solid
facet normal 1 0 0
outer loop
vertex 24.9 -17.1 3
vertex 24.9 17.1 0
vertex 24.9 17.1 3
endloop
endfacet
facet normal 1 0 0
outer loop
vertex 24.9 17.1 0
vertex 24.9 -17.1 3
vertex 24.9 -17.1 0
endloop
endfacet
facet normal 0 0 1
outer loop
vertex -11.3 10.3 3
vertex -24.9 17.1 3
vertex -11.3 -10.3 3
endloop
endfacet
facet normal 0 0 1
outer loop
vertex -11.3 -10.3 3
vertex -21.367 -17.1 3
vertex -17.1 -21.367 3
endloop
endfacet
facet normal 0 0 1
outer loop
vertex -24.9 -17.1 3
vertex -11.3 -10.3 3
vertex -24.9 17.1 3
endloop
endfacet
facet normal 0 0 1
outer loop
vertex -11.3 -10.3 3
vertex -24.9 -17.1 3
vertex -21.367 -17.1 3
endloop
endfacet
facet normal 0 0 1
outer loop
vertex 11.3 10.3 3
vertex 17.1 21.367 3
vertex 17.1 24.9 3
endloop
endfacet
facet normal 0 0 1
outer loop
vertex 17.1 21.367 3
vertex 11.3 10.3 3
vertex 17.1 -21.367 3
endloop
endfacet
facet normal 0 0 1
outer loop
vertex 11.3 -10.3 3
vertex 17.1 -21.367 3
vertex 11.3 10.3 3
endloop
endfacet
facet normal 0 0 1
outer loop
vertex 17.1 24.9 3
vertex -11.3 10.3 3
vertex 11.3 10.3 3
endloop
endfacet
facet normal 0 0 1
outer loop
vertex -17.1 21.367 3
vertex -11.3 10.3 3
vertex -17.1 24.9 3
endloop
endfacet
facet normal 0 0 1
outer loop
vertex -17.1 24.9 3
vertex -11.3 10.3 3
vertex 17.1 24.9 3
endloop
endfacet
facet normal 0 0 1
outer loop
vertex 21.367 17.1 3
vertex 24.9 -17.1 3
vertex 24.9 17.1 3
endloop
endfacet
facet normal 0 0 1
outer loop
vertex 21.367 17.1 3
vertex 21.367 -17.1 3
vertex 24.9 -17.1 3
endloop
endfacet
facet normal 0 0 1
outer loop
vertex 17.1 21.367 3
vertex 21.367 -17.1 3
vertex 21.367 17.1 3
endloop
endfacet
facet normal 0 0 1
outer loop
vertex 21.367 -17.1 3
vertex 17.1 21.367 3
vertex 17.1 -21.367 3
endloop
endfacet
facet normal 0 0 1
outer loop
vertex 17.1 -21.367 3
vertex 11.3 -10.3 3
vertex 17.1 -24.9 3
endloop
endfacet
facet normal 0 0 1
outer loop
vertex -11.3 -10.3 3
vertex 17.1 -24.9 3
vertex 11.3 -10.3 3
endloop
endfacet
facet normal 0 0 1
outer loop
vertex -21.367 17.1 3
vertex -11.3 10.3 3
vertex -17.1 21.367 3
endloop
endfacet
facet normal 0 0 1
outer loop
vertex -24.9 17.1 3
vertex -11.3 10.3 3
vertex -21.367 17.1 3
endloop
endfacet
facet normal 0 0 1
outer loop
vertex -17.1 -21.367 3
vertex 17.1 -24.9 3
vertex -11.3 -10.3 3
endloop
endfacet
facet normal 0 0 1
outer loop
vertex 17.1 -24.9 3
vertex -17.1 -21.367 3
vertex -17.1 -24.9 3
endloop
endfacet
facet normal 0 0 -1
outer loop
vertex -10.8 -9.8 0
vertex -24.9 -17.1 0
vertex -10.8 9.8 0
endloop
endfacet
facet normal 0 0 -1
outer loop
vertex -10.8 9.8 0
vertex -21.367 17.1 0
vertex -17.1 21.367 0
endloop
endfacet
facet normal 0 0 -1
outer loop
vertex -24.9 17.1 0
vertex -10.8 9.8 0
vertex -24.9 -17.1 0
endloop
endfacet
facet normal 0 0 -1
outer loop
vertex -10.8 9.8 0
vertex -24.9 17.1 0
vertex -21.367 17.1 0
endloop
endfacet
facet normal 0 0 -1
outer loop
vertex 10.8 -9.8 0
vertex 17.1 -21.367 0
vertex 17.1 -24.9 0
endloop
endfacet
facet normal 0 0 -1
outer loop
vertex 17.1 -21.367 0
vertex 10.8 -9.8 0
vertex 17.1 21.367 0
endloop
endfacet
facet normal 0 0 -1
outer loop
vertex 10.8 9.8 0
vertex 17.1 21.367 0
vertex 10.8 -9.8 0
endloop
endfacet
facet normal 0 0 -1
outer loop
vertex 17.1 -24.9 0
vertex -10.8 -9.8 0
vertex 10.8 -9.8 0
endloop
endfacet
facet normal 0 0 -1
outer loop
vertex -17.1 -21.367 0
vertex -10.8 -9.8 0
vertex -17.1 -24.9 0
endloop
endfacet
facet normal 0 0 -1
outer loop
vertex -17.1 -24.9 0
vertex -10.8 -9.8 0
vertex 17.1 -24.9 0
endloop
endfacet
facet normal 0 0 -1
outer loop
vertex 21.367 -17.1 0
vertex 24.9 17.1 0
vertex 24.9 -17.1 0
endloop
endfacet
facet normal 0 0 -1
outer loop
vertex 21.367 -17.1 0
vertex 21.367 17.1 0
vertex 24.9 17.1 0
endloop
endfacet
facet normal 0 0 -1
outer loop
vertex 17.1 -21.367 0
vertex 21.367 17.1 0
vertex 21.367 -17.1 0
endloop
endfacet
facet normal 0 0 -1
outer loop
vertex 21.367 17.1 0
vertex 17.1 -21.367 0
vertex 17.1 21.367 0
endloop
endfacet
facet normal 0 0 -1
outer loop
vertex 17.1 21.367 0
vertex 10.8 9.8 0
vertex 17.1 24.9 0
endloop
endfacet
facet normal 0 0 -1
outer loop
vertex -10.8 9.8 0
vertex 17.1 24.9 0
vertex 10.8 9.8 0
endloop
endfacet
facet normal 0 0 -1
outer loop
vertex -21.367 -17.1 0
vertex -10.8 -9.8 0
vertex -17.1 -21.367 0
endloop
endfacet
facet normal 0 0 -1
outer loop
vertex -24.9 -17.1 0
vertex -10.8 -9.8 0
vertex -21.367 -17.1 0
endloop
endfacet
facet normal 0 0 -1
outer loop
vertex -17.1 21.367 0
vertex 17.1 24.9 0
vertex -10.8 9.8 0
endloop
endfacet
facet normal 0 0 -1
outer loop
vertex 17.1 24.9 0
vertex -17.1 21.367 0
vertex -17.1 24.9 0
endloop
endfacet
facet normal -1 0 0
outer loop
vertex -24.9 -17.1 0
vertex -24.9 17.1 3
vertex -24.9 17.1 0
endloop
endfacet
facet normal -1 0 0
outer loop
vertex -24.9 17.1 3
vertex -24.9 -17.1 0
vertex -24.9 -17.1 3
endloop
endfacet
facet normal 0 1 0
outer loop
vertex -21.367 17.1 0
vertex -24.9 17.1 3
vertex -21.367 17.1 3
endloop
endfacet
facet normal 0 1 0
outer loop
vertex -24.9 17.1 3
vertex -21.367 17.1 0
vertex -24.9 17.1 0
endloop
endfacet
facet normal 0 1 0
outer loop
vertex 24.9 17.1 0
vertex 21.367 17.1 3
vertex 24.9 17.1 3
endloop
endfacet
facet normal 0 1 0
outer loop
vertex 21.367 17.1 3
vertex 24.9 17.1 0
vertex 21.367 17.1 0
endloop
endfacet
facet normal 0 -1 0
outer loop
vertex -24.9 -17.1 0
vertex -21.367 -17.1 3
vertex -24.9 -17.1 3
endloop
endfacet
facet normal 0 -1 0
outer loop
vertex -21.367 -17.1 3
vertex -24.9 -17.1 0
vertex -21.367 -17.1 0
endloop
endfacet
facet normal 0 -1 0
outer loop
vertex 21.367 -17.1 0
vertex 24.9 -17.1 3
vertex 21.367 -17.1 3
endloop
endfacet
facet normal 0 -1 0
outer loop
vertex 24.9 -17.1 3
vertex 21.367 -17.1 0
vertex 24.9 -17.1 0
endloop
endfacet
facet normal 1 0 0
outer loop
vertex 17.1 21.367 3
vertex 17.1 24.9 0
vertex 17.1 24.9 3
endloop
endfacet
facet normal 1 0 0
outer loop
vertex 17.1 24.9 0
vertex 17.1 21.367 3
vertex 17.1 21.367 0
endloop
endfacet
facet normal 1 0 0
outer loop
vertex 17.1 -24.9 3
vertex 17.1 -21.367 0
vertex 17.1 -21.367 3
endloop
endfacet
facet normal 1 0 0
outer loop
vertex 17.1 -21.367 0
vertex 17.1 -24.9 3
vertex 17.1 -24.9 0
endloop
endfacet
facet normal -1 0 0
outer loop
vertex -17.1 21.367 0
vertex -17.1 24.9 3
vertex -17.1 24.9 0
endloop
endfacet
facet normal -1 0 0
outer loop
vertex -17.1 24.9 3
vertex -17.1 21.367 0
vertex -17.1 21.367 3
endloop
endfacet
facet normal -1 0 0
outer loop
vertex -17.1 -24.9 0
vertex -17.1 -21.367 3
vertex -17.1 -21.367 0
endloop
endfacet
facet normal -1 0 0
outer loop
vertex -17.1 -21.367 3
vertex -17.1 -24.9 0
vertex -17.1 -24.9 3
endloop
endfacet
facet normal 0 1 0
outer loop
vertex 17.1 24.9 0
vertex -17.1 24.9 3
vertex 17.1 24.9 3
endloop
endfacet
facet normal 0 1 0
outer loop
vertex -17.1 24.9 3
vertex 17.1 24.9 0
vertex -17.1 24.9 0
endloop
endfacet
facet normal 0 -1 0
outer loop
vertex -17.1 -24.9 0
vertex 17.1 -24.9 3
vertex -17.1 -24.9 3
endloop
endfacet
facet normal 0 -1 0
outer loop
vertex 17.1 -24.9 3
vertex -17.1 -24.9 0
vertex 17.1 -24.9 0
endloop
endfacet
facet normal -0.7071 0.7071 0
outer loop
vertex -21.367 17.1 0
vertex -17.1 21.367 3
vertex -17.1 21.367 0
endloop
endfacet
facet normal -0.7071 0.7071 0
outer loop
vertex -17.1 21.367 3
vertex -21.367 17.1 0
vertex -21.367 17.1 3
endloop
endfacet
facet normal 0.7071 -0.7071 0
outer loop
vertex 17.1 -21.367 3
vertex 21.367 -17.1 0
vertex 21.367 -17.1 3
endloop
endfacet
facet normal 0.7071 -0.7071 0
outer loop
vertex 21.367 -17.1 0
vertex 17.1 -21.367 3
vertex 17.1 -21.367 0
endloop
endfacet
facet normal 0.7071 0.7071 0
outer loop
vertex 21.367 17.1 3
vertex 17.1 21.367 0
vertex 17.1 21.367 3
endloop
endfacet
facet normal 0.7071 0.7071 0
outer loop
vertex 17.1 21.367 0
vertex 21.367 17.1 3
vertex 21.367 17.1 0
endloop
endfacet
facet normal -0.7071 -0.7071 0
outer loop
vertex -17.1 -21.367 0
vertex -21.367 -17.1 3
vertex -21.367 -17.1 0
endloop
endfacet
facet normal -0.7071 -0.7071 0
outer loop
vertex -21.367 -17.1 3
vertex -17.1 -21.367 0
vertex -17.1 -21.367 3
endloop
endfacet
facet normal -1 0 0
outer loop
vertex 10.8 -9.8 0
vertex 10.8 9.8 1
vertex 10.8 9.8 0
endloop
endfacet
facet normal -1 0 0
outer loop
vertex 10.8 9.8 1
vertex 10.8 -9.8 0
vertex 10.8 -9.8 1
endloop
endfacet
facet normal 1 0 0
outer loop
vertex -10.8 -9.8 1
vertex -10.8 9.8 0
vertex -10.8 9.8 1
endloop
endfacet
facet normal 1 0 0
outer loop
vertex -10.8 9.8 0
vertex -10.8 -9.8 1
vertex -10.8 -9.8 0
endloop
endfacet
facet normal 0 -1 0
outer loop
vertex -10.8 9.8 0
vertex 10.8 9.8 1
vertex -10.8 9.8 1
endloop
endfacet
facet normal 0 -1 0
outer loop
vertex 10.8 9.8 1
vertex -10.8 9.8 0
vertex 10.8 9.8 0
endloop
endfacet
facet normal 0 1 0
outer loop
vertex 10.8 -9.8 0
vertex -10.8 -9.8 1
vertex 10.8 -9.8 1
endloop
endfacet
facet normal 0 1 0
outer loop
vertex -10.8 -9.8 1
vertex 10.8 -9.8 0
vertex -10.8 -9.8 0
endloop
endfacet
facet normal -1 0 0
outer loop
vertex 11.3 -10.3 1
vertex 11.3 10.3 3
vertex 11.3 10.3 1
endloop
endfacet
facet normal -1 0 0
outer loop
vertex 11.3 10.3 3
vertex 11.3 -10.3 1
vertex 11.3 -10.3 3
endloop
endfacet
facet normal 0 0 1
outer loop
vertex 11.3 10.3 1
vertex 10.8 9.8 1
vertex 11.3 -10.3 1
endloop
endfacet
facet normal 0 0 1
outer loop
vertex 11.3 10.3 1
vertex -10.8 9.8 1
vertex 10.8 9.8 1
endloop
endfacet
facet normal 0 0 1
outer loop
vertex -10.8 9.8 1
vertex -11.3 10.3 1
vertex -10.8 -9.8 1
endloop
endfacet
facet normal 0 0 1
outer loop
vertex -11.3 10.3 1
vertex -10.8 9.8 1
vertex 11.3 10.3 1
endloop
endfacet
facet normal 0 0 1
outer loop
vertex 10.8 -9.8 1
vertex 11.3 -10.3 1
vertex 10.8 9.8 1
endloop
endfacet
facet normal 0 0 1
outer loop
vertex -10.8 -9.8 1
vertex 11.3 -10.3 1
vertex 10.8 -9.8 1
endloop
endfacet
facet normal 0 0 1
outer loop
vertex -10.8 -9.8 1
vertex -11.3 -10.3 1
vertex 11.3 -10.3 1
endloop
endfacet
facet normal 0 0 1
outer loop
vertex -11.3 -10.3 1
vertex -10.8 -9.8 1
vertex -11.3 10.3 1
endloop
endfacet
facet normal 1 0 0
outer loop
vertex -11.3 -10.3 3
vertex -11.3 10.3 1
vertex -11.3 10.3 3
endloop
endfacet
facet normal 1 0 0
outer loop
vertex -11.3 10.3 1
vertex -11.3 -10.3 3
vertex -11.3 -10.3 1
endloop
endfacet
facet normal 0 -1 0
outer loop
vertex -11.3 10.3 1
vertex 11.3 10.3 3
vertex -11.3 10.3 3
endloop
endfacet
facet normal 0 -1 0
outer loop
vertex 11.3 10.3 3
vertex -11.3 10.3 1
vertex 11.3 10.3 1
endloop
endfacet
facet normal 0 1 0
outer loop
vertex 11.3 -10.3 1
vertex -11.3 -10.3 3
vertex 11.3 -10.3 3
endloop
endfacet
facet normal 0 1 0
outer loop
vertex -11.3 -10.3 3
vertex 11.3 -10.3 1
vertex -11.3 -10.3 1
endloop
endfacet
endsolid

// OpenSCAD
//Cube with walls insert template

IM_offset = 0.3;

a = 49.8;
b = 33.6;
c = 6.28;
d = 53.8;
h = 3; //holder height

hole_w = 22;
hole_l = 20;

step_w = 1;
step_h = 1;

module CubeInsert () {
    translate([0,0,h/2])
    difference(){
        union() {   //basic insert design
            cube([a,b+2*IM_offset,h], center=true);
            cube([b+2*IM_offset,a,h], center=true);
            rotate(a=[0,0,45]){
                cube([c,d+2*IM_offset,h], center=true);
            }
            rotate(a=[0,0,-45]){
                cube([c,d+2*IM_offset,h], center=true);
            }
        }
    }
}


module CLensInsert () {
    difference() {
        CubeInsert();
        translate([-(hole_w-step_w+2*IM_offset)/2,-(hole_l-step_w+2*IM_offset)/2,0])
            cube([hole_w-step_w+2*IM_offset,hole_l-step_w+2*IM_offset,20]);
        translate([-(hole_w+2*IM_offset)/2,-(hole_l+2*IM_offset)/2,step_h])
            cube([hole_w+2*IM_offset,hole_l+2*IM_offset,20]);
    }
}

CLensInsert();
